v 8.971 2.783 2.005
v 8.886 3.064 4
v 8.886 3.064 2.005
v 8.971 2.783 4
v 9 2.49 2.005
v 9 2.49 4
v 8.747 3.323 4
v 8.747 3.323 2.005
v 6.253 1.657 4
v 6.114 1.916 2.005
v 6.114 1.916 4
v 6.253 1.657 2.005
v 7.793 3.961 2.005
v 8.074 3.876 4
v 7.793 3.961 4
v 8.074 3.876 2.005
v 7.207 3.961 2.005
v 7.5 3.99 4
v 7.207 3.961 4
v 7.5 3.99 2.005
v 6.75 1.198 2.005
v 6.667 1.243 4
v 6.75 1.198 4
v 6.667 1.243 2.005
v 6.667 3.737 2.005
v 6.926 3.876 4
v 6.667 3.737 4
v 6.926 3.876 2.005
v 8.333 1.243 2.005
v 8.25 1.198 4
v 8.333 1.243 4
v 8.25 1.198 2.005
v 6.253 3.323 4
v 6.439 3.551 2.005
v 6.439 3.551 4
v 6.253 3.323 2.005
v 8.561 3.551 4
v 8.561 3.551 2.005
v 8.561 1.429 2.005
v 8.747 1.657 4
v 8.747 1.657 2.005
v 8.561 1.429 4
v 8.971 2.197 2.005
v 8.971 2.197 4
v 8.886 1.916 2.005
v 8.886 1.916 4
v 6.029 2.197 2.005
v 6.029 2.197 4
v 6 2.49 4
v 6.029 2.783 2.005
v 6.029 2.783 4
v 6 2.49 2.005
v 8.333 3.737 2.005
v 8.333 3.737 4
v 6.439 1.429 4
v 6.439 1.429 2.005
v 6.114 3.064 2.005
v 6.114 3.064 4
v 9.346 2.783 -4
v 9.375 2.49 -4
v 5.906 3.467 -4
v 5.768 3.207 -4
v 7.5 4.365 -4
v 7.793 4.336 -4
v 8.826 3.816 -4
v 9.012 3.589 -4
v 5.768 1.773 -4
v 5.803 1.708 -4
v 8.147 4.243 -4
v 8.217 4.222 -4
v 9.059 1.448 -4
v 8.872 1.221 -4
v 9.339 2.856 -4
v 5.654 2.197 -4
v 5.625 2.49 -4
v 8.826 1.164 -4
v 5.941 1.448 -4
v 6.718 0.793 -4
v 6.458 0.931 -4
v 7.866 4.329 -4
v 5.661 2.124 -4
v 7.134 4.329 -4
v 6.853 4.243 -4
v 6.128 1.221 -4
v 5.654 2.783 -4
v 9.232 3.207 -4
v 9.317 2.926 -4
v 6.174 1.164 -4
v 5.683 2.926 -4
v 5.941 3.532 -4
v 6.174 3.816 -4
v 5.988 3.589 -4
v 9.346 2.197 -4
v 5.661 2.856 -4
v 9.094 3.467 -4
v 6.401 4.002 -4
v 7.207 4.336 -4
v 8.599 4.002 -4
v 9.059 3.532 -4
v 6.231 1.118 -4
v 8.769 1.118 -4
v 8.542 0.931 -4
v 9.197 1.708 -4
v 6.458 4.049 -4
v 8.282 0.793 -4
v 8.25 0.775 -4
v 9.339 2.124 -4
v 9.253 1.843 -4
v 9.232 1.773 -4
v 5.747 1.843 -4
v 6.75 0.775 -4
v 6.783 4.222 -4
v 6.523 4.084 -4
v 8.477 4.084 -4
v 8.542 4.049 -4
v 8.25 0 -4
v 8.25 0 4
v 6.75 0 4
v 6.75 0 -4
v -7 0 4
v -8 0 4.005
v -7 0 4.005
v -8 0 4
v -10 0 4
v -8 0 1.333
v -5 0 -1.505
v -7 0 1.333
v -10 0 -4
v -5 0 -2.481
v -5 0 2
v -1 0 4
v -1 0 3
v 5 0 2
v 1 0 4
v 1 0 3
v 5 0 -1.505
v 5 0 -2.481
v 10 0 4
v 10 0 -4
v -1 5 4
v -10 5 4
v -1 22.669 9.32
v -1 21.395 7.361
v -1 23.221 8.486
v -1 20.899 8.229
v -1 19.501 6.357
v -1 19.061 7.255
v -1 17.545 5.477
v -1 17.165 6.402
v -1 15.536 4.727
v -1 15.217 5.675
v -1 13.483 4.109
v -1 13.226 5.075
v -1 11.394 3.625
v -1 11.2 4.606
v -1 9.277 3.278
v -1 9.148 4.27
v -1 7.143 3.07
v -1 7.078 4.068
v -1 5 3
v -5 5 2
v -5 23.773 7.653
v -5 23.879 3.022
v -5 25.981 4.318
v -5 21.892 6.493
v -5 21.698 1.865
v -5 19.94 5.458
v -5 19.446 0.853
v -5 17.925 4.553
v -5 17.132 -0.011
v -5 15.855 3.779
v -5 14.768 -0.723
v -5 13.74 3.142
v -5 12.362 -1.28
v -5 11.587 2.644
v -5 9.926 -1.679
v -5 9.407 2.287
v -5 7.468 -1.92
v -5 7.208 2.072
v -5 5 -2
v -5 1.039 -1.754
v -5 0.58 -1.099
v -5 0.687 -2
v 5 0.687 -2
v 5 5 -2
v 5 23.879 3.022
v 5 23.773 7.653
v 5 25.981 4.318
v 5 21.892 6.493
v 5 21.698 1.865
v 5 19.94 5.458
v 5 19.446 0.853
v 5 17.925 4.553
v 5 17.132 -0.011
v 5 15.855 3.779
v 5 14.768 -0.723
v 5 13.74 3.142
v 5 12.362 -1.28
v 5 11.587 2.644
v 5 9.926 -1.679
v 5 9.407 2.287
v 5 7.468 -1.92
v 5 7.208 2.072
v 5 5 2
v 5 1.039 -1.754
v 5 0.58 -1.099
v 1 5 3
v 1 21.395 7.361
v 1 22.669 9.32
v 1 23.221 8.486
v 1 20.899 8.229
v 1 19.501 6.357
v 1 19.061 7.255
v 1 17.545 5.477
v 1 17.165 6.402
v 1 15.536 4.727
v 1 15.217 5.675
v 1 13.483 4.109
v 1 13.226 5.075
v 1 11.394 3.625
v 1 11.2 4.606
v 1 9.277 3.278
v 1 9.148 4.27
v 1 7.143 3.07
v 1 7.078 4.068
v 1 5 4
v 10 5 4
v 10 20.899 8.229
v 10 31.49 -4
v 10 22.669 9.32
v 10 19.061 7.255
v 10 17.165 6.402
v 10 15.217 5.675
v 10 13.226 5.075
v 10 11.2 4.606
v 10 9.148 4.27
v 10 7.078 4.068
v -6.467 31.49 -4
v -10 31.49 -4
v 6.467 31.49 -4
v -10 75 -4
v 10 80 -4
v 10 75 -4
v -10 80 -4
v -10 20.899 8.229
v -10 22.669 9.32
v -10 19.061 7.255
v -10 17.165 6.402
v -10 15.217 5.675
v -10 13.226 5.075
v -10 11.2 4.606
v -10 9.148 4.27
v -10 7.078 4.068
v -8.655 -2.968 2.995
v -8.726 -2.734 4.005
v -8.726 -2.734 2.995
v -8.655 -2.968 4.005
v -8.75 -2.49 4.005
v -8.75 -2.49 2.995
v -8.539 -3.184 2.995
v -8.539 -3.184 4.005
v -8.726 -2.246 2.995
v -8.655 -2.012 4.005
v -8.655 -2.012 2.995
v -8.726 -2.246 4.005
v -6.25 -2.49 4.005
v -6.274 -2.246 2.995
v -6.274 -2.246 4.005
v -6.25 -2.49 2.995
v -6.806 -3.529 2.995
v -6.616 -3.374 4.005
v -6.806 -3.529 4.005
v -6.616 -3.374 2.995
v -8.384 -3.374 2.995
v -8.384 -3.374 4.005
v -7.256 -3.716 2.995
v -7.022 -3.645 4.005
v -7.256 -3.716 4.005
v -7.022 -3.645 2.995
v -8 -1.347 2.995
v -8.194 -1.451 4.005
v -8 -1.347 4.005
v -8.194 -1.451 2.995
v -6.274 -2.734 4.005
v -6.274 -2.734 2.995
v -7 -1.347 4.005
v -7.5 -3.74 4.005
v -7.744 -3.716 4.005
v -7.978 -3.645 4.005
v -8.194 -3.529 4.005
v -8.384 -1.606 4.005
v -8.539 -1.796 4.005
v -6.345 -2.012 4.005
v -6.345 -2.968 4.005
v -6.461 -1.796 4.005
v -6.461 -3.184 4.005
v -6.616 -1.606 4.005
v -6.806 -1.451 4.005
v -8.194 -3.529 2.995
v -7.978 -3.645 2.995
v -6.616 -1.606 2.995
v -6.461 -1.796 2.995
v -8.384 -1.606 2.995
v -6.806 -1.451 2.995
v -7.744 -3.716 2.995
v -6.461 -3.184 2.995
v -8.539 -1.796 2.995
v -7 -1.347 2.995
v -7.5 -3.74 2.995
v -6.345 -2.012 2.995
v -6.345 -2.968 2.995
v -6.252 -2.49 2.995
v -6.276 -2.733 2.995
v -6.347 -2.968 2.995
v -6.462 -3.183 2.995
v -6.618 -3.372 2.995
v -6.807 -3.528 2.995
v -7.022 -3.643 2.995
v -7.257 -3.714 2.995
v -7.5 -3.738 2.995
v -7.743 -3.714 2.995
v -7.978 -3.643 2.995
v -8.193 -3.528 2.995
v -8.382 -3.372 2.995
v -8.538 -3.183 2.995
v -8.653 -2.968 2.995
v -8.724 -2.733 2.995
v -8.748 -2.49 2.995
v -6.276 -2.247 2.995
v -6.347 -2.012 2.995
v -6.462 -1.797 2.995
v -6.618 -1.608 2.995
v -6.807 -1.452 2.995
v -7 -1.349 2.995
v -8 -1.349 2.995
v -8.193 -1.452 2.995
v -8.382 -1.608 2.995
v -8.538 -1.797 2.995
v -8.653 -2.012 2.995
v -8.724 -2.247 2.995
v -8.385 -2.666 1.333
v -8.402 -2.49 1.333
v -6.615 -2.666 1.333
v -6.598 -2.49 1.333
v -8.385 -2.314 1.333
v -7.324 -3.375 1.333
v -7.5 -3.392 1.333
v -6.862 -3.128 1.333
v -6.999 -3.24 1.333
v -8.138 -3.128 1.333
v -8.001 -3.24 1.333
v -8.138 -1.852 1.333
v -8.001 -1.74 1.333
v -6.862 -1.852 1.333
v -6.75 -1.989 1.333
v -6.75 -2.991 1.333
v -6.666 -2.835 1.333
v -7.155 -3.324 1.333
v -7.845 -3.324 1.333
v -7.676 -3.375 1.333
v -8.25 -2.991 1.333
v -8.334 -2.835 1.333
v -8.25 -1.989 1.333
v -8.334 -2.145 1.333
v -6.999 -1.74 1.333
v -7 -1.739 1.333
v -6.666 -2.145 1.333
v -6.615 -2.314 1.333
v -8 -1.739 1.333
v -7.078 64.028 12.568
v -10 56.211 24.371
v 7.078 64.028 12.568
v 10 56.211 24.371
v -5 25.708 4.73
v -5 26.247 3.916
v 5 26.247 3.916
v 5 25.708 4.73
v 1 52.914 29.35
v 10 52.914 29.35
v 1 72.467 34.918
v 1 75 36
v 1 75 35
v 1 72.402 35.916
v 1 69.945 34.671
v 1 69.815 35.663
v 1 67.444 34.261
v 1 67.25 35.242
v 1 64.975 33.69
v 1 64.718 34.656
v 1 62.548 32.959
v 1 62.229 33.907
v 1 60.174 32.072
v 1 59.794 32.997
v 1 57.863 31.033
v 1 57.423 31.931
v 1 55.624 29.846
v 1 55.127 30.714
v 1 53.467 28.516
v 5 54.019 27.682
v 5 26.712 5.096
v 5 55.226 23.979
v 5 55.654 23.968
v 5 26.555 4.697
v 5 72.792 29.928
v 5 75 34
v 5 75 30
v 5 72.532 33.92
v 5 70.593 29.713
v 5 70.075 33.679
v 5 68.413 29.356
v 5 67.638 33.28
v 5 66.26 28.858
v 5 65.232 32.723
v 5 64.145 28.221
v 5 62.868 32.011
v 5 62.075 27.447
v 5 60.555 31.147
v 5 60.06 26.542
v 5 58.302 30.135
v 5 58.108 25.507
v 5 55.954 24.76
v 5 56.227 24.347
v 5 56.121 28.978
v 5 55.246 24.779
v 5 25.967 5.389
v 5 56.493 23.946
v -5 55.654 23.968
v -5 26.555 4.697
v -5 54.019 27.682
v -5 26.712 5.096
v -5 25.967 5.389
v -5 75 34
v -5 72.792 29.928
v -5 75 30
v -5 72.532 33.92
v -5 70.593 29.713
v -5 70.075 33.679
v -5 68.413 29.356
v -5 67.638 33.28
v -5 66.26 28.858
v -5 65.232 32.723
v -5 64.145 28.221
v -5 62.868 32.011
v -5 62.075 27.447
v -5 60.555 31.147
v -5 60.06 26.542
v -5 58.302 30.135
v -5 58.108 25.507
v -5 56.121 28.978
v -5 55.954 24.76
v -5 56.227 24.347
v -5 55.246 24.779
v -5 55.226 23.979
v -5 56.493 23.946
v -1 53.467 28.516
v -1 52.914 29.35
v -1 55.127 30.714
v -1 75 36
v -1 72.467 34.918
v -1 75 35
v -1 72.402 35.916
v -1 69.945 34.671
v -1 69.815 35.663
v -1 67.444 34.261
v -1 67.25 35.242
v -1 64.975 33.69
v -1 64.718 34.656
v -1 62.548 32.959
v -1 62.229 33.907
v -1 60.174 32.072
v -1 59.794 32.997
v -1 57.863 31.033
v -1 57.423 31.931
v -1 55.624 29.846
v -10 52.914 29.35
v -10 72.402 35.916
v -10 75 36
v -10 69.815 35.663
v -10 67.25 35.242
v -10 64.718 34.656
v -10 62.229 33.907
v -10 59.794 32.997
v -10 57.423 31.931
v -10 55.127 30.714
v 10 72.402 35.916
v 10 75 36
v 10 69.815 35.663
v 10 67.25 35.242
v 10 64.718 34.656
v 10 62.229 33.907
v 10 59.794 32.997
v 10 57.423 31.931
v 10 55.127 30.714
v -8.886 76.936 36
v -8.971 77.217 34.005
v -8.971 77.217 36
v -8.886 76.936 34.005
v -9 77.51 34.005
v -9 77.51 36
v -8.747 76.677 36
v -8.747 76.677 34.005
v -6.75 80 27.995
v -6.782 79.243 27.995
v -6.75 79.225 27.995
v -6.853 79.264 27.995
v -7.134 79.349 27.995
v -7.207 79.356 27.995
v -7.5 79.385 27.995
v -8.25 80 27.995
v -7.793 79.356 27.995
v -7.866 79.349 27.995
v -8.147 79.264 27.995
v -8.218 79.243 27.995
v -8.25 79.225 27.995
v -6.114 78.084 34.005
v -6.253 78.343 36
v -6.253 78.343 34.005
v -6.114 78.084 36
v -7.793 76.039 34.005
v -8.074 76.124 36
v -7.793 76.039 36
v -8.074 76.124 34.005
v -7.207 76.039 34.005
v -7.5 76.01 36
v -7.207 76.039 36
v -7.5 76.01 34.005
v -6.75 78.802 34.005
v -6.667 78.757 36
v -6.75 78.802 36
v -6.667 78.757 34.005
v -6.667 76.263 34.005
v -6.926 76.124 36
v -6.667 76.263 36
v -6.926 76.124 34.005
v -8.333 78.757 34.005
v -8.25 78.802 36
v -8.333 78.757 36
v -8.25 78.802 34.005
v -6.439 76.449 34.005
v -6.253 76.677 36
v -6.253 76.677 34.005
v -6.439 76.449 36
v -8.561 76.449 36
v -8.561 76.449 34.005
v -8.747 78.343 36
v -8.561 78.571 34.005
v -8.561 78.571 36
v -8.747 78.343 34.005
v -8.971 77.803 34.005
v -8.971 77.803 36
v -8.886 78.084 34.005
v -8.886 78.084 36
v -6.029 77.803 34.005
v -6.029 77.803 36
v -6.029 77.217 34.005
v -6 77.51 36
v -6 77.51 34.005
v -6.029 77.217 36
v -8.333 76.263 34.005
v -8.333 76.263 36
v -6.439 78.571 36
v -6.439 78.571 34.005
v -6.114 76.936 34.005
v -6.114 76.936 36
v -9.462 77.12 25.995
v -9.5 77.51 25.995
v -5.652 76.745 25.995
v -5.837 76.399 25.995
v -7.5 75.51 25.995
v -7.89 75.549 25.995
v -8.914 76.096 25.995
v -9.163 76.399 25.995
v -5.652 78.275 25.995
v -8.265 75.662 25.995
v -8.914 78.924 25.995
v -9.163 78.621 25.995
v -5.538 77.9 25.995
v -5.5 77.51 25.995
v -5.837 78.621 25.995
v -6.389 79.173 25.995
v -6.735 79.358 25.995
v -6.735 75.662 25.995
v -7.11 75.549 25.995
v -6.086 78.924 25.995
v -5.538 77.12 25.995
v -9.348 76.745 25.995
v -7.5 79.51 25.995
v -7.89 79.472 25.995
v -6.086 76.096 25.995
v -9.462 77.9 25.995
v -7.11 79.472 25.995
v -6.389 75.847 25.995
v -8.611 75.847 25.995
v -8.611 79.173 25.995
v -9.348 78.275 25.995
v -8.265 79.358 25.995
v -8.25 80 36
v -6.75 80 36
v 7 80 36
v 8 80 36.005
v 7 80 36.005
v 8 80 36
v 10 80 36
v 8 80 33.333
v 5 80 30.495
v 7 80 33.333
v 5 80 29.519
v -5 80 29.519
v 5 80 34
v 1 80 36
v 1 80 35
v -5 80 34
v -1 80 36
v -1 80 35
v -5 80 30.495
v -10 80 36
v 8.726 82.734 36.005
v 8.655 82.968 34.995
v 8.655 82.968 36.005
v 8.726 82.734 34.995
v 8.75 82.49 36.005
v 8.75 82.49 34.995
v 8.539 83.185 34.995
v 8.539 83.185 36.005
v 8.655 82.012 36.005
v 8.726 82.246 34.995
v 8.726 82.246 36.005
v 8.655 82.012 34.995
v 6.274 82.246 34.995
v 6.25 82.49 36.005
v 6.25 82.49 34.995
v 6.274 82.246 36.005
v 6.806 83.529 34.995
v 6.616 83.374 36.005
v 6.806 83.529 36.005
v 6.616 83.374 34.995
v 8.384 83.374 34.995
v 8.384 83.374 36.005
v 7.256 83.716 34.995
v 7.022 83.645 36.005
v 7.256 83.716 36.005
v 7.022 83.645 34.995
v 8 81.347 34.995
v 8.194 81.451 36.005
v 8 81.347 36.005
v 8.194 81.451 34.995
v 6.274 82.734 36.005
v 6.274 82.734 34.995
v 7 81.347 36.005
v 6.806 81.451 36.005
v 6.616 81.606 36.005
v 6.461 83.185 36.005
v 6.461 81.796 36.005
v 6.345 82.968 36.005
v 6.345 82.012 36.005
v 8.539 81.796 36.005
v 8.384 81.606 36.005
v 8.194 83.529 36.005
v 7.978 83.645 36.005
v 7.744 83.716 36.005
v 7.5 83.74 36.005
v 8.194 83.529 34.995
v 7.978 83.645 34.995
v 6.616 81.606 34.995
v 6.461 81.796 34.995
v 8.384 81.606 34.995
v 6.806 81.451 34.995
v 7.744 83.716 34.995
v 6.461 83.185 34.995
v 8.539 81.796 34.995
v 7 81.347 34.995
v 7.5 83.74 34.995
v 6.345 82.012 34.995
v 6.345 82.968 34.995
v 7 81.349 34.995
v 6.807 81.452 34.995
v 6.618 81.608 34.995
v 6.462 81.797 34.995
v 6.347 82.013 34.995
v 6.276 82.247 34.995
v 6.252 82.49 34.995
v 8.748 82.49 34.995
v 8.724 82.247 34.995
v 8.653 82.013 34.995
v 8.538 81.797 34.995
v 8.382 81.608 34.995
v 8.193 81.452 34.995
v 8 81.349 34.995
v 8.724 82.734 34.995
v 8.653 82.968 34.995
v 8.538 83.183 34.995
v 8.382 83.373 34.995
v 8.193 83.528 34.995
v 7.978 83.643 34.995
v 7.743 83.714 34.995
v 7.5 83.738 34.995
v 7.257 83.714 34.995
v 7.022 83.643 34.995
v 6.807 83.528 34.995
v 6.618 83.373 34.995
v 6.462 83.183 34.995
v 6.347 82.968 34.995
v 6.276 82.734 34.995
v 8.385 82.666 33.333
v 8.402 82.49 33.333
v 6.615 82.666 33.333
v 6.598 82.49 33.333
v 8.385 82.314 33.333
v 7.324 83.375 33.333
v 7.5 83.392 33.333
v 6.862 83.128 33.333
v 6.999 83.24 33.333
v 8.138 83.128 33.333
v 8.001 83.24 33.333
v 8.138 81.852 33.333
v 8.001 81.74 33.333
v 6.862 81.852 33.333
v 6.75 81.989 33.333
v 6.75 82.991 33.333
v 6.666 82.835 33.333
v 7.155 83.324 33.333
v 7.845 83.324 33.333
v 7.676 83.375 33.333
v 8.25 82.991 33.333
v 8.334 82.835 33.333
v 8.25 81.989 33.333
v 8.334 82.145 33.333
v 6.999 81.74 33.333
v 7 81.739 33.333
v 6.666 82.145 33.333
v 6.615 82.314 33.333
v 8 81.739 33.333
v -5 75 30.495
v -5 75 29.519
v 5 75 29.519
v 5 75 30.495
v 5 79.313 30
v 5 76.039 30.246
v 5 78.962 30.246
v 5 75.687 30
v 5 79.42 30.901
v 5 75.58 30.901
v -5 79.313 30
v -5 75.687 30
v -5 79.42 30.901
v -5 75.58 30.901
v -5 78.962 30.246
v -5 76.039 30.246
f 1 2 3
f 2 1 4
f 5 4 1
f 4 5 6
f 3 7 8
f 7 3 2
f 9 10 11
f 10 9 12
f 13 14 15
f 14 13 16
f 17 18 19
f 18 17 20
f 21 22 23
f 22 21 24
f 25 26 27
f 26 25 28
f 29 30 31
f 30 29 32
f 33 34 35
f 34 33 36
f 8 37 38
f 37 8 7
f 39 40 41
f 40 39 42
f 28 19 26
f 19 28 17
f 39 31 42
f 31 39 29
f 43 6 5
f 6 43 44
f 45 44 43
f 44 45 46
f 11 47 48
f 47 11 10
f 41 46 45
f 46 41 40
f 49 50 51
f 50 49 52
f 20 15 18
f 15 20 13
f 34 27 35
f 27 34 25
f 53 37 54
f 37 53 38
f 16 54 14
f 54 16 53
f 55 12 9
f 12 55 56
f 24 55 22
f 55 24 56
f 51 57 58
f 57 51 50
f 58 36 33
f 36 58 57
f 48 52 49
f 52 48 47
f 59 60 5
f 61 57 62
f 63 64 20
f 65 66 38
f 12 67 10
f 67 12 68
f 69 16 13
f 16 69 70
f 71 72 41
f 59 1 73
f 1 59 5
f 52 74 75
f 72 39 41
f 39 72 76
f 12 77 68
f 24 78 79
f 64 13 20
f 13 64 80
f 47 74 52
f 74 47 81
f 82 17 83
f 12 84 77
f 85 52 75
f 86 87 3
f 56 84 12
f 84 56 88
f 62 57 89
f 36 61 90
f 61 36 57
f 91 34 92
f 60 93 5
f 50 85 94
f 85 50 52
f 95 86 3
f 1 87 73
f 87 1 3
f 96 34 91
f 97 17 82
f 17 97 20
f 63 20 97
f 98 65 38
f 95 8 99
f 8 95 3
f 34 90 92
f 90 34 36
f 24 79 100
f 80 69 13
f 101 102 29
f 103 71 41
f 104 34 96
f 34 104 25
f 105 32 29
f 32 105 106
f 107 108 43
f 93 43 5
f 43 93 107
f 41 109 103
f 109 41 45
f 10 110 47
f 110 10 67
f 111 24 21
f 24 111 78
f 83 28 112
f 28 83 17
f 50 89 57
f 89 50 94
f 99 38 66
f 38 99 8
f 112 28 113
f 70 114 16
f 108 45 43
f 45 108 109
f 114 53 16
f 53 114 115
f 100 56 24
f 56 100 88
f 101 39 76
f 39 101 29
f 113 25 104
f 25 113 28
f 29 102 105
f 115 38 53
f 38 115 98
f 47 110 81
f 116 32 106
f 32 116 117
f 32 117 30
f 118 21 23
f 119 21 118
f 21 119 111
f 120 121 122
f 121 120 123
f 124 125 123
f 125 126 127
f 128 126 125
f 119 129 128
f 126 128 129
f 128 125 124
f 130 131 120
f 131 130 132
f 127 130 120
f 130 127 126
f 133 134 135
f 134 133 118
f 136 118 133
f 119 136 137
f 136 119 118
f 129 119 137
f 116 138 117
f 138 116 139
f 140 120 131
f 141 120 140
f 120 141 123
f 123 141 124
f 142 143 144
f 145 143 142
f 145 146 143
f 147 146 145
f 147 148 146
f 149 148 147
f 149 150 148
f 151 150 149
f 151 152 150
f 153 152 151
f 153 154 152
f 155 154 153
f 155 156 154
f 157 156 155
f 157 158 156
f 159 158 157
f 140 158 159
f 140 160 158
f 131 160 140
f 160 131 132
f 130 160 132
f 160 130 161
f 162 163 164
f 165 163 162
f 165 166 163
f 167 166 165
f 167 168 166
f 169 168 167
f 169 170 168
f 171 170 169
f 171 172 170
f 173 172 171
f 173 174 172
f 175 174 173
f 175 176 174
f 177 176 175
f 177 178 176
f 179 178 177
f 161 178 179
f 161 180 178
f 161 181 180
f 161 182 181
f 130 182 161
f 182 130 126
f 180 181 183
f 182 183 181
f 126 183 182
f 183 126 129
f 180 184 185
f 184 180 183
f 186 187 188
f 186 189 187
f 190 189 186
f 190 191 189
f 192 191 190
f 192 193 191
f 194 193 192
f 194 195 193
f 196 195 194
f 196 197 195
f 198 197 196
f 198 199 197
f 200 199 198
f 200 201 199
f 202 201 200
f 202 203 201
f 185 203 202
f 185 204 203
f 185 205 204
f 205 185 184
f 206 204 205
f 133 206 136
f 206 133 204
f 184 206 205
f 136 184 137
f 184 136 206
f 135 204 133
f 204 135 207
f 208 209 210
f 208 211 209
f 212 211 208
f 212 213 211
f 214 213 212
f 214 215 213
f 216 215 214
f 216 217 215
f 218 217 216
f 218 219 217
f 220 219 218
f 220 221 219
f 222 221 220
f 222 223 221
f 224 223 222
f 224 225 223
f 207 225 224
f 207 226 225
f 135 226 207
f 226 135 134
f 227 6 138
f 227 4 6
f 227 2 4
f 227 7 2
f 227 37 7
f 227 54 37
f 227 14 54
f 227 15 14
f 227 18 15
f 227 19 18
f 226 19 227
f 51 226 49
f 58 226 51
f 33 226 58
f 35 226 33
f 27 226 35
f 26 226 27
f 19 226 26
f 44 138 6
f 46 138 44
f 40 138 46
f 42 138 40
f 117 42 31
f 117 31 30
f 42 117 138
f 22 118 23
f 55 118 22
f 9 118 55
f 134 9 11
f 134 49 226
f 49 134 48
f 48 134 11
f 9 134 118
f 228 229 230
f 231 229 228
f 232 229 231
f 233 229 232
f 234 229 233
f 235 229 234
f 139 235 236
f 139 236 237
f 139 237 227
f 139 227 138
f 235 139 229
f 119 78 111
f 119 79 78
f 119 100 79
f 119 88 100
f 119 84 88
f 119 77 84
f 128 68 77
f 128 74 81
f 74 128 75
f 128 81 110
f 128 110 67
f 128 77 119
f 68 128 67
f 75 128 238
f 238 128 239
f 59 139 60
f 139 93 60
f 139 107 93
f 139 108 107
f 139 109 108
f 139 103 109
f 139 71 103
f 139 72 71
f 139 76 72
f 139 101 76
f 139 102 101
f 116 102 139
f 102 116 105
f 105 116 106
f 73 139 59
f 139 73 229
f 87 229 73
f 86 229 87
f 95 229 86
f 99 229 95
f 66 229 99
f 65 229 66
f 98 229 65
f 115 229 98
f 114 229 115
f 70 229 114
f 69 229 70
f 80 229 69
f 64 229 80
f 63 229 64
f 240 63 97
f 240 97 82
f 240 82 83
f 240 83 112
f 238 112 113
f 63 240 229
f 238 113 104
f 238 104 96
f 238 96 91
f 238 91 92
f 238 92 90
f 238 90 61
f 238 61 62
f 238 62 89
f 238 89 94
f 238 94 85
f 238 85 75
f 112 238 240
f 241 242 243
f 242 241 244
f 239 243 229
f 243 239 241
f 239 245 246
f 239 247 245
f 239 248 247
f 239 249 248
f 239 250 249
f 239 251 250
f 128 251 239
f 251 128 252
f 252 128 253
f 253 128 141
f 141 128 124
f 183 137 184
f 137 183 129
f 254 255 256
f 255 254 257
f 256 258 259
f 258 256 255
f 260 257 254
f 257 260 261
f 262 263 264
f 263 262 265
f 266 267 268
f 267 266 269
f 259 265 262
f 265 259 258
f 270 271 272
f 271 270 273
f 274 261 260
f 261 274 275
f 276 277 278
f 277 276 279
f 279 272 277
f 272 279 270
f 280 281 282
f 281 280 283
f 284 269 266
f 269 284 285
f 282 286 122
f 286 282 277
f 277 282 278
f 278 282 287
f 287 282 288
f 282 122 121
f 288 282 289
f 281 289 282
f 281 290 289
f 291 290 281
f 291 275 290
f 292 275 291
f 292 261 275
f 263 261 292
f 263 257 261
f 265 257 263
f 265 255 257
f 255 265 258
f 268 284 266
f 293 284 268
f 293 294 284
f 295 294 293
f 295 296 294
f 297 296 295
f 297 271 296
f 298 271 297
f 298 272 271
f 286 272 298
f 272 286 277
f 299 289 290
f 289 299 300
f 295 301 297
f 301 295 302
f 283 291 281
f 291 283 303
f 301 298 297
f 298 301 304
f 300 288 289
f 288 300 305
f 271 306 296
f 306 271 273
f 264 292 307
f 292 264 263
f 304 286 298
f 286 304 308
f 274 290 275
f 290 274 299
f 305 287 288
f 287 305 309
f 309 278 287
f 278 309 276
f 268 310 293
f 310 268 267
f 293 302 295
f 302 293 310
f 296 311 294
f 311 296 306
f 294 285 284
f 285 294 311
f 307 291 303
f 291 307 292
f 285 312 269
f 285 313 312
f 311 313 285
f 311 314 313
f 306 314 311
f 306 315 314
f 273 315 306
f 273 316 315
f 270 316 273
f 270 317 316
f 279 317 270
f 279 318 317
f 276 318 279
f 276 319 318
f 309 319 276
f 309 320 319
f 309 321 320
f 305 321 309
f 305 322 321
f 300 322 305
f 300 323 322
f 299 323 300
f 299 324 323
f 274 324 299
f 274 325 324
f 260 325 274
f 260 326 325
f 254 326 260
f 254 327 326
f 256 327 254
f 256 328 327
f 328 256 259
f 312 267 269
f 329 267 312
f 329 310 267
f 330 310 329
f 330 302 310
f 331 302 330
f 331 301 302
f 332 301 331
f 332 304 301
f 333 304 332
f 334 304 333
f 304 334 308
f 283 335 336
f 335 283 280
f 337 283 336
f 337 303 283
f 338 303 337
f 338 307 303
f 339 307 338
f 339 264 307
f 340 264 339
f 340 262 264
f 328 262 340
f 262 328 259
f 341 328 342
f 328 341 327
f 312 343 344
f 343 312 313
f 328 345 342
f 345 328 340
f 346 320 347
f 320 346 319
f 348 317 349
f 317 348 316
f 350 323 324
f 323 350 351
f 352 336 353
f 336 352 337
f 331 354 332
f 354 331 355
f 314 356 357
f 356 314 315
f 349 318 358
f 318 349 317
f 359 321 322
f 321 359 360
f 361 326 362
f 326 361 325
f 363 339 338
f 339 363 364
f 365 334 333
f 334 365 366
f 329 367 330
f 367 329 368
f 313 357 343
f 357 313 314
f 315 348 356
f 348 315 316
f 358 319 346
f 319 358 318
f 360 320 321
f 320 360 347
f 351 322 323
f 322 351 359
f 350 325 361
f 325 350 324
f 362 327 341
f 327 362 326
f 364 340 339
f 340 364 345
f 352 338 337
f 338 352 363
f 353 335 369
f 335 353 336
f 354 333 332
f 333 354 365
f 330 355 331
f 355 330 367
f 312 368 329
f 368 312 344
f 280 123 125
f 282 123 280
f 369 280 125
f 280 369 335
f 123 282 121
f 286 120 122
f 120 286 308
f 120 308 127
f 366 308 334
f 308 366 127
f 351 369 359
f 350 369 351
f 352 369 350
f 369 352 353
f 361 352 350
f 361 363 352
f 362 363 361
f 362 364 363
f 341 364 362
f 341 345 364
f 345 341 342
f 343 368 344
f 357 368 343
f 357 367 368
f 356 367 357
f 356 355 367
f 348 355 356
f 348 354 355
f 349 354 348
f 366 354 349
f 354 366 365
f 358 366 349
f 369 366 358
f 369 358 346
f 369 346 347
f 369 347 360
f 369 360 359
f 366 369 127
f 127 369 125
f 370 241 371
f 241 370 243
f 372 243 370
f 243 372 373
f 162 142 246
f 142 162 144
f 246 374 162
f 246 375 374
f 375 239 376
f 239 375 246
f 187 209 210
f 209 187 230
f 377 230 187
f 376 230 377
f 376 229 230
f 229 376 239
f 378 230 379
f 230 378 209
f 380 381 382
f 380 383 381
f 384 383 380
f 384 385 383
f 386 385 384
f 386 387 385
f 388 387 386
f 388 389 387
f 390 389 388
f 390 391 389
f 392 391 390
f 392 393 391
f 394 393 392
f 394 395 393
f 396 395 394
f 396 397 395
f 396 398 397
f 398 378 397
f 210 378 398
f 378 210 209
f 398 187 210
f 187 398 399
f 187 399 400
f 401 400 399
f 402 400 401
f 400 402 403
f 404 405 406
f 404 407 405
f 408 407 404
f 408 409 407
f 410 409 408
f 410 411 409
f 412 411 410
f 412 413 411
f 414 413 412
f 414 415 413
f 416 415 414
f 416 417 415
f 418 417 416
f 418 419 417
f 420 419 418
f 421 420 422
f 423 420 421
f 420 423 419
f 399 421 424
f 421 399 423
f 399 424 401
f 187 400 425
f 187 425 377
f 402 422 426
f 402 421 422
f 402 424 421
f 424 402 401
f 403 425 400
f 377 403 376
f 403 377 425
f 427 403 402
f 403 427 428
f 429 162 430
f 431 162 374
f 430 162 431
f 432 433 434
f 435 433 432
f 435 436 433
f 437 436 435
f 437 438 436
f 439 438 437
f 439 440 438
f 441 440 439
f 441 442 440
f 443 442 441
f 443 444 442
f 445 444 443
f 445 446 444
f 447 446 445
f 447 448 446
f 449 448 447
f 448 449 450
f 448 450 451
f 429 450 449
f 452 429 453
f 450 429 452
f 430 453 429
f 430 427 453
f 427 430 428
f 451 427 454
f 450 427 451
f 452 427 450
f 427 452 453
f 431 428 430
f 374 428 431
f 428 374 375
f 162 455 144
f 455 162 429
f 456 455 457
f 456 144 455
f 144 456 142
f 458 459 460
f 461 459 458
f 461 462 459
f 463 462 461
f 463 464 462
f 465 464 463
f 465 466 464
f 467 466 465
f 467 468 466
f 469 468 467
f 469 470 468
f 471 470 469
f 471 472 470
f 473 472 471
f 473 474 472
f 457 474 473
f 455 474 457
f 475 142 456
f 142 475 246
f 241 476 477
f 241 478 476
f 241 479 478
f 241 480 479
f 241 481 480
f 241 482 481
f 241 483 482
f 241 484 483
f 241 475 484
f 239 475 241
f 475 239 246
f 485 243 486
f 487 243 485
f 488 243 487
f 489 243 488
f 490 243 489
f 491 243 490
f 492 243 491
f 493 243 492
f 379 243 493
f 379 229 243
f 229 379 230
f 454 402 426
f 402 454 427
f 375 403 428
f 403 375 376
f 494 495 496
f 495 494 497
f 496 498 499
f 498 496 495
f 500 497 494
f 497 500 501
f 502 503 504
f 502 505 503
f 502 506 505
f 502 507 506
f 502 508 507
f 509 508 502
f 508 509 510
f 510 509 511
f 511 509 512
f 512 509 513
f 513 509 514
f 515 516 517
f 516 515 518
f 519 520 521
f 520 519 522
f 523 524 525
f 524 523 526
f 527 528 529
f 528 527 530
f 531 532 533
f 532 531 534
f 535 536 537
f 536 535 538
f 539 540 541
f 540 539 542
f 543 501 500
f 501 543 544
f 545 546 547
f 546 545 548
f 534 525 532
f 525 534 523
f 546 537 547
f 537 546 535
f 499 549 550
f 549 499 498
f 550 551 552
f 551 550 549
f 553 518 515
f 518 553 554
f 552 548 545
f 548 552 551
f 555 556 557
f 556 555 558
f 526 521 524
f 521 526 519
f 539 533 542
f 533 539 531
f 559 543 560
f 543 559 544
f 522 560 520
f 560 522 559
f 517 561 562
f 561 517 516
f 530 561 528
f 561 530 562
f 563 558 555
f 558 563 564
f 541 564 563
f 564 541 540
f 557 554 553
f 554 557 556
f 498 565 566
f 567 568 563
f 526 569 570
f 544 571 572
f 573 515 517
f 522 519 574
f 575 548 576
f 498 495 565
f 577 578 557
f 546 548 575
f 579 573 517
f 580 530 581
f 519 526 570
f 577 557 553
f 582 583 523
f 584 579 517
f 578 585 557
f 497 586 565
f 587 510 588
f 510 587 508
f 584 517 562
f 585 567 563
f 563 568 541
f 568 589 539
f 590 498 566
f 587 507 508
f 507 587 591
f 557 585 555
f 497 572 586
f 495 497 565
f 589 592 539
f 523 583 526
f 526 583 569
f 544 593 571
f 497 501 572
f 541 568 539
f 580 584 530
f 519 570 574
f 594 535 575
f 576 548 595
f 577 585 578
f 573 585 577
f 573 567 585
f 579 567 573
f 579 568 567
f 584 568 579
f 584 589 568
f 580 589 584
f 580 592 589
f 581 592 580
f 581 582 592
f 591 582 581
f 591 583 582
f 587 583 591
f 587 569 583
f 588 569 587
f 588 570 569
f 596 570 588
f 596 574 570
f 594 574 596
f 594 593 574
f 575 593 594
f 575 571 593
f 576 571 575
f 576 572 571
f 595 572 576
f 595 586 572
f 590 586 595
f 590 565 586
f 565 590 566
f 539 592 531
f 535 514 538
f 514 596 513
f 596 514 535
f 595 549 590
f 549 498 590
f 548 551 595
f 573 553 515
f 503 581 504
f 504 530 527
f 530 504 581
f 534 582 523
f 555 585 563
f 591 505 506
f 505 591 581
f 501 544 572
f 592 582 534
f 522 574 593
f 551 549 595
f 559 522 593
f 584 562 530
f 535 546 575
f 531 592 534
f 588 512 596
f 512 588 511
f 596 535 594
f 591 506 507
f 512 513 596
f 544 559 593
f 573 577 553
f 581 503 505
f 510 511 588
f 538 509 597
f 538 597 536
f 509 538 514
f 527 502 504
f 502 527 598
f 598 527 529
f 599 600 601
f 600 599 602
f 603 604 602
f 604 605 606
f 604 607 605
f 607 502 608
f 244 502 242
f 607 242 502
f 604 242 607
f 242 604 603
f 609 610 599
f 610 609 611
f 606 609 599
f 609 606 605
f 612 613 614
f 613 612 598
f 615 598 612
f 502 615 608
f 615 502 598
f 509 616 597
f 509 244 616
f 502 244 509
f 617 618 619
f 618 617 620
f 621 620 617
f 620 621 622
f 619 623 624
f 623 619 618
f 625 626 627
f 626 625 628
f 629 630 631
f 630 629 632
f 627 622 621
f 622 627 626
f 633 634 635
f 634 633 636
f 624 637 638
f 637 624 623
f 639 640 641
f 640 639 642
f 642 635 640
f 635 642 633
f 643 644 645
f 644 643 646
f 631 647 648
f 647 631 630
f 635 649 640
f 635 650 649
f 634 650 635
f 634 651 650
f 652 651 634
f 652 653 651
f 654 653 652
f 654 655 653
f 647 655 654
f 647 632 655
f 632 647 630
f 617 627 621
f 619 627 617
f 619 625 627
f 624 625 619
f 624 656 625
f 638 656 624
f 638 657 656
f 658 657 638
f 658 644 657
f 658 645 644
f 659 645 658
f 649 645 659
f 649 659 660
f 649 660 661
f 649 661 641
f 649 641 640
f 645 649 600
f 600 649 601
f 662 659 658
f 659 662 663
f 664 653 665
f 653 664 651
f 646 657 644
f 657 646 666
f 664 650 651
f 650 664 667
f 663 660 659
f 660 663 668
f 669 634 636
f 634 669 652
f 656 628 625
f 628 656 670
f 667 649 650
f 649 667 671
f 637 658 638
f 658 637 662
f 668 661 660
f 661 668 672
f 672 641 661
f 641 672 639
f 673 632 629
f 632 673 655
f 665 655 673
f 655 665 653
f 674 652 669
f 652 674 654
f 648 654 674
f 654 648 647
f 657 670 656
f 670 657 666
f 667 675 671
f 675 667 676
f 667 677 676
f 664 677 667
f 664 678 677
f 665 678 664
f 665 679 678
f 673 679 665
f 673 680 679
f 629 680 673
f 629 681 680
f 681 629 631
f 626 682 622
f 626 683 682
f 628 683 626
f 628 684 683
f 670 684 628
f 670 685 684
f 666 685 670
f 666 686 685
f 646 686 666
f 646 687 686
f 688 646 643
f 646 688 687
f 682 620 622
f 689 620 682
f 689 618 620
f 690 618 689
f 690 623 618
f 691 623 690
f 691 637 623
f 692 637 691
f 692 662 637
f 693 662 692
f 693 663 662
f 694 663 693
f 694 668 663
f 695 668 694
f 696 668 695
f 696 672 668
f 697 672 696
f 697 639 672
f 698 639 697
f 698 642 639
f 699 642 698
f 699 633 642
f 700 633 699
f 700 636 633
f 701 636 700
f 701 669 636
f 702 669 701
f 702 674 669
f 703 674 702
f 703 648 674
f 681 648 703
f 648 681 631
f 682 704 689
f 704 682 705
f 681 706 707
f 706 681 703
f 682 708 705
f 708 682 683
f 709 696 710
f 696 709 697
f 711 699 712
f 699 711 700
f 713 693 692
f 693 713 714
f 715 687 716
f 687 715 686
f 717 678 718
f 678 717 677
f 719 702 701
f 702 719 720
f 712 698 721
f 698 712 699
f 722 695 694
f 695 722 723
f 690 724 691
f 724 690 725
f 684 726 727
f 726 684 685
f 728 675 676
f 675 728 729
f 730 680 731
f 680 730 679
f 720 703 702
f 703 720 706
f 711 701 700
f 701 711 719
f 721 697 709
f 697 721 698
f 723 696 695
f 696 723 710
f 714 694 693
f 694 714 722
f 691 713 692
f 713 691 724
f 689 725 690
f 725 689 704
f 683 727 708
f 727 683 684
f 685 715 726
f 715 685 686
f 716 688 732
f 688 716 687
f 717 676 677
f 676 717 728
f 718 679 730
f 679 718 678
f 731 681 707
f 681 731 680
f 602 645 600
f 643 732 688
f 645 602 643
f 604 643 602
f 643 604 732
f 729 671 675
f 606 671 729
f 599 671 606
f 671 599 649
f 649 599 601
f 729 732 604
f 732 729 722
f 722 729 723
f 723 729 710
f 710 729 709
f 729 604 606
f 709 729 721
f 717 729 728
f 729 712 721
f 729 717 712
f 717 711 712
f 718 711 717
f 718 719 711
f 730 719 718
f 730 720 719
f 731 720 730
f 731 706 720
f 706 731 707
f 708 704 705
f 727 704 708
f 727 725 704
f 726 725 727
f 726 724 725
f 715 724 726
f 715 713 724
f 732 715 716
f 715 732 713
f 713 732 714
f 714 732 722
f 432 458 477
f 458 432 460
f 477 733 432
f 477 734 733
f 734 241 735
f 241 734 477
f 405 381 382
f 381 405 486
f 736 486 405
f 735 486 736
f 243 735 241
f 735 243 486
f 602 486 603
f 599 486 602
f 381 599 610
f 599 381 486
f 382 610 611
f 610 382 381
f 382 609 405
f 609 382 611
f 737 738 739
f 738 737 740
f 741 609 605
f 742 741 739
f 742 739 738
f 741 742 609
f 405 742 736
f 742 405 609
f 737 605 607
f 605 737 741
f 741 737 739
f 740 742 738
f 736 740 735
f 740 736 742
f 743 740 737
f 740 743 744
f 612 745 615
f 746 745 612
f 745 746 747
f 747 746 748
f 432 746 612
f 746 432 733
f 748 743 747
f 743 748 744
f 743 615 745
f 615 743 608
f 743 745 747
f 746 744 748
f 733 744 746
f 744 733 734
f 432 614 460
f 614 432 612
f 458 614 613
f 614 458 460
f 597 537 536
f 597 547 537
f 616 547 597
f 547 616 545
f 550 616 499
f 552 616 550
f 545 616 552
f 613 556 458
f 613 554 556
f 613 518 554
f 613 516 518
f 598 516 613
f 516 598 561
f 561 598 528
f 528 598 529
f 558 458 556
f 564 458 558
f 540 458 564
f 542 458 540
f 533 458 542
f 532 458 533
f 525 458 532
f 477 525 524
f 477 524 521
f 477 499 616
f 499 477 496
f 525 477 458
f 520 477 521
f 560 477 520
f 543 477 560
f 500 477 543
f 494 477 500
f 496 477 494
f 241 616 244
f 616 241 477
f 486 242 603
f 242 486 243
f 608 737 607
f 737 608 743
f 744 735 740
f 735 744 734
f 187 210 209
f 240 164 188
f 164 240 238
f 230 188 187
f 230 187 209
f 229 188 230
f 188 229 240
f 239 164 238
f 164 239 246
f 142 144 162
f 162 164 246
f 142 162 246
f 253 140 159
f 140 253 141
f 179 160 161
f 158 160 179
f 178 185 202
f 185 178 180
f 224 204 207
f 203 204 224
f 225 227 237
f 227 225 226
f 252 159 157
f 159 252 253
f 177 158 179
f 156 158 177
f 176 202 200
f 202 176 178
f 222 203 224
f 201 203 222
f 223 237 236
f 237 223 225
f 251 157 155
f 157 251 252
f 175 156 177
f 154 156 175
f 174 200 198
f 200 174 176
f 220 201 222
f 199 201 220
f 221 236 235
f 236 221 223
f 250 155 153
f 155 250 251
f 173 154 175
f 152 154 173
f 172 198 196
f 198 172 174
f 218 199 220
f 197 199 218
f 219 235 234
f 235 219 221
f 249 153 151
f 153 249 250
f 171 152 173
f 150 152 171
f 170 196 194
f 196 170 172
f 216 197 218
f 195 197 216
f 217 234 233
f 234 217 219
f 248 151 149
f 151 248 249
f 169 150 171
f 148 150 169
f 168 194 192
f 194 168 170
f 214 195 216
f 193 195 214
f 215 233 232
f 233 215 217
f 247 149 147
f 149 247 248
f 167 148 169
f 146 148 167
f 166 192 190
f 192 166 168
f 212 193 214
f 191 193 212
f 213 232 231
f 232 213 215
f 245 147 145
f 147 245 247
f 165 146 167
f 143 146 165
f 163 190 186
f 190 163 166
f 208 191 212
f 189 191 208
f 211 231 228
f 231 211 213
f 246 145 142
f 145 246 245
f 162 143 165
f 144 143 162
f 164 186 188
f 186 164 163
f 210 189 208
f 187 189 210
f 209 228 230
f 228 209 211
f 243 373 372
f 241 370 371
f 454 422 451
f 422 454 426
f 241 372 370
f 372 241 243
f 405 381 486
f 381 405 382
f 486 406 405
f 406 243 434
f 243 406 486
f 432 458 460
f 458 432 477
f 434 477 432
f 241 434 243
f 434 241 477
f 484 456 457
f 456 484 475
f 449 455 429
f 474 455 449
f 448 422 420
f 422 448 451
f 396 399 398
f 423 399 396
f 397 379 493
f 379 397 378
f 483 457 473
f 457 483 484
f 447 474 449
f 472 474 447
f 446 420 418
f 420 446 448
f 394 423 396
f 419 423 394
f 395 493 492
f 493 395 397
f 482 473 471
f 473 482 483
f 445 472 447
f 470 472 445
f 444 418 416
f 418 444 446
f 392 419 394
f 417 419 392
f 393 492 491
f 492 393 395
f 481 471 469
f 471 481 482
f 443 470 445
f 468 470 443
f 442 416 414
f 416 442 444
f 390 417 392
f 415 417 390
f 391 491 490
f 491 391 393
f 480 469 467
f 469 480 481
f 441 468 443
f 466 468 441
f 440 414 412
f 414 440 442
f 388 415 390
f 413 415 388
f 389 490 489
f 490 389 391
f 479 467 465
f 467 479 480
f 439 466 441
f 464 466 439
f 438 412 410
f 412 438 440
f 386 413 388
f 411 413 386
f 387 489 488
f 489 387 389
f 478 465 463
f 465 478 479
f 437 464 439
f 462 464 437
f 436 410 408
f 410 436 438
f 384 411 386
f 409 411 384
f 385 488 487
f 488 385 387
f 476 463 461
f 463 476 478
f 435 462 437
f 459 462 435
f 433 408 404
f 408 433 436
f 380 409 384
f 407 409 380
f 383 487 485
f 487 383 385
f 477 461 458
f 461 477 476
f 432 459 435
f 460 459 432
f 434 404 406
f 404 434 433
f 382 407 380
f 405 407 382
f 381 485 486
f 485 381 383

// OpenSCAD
/*
    ttt_ramp_2.scad
        
    ramp_height must be identical to "height" from <train_tube_track.scad>
*/

include <train_tube_track.scad>;

// the following variables are calculated by ramp_calc.c
ramp_height = 32.000000;
ramp_inner_length = 70.000000;
ramp_radius = 36.000000;
ramp_arc = 33.514179; // degree
ramp_slope = 33.514177; // degree
ramp_straight_length = 36.276711; 
ramp_straight_y = 19.877160;
ramp_straight_z = 5.985029;

difference() {
    union() {
        // left plug
        translate([0,2.50,0])
        rotate([0,0,180])
        straight_track_single_plug(eocstl);

        // first arc
        translate([0, eocstl, ramp_radius])
        rotate([0,90,0])
        rotate_extrude(angle=ramp_arc, convexity = 10, $fn=100) 
        translate([ramp_radius, 0, 0])
        rotate([0,0,90])
        polygon(tube_profile_h);

        // straight slope
        translate([0, eocstl+ramp_straight_y+0.0001, ramp_straight_z])
        rotate([ramp_slope, 0, 0])
        translate([0,ramp_straight_length/2,0 ])
        straight_track_h_no_plug(ramp_straight_length);

        // second arg
        translate([0,eocstl+ramp_inner_length+0.0001, ramp_height])
        translate([0,0, -ramp_radius])
        rotate([ramp_arc,0,0])
        rotate([0,-90,0])
        rotate_extrude(angle=ramp_arc, convexity = 20, $fn=100) 
        translate([ramp_radius, 0, 0])
        rotate([0,0,-90])
        polygon(tube_profile_h);

        // right plug
        translate([0,eocstl+2.5+ramp_inner_length+0.0001, ramp_height])
        straight_track_h_single_plug(eocstl);
    }
    translate([0,grid,-ramp_height/2-outer_height/2])
    cube([outer_width+0.1, grid*3, ramp_height], center=true);
    
}
